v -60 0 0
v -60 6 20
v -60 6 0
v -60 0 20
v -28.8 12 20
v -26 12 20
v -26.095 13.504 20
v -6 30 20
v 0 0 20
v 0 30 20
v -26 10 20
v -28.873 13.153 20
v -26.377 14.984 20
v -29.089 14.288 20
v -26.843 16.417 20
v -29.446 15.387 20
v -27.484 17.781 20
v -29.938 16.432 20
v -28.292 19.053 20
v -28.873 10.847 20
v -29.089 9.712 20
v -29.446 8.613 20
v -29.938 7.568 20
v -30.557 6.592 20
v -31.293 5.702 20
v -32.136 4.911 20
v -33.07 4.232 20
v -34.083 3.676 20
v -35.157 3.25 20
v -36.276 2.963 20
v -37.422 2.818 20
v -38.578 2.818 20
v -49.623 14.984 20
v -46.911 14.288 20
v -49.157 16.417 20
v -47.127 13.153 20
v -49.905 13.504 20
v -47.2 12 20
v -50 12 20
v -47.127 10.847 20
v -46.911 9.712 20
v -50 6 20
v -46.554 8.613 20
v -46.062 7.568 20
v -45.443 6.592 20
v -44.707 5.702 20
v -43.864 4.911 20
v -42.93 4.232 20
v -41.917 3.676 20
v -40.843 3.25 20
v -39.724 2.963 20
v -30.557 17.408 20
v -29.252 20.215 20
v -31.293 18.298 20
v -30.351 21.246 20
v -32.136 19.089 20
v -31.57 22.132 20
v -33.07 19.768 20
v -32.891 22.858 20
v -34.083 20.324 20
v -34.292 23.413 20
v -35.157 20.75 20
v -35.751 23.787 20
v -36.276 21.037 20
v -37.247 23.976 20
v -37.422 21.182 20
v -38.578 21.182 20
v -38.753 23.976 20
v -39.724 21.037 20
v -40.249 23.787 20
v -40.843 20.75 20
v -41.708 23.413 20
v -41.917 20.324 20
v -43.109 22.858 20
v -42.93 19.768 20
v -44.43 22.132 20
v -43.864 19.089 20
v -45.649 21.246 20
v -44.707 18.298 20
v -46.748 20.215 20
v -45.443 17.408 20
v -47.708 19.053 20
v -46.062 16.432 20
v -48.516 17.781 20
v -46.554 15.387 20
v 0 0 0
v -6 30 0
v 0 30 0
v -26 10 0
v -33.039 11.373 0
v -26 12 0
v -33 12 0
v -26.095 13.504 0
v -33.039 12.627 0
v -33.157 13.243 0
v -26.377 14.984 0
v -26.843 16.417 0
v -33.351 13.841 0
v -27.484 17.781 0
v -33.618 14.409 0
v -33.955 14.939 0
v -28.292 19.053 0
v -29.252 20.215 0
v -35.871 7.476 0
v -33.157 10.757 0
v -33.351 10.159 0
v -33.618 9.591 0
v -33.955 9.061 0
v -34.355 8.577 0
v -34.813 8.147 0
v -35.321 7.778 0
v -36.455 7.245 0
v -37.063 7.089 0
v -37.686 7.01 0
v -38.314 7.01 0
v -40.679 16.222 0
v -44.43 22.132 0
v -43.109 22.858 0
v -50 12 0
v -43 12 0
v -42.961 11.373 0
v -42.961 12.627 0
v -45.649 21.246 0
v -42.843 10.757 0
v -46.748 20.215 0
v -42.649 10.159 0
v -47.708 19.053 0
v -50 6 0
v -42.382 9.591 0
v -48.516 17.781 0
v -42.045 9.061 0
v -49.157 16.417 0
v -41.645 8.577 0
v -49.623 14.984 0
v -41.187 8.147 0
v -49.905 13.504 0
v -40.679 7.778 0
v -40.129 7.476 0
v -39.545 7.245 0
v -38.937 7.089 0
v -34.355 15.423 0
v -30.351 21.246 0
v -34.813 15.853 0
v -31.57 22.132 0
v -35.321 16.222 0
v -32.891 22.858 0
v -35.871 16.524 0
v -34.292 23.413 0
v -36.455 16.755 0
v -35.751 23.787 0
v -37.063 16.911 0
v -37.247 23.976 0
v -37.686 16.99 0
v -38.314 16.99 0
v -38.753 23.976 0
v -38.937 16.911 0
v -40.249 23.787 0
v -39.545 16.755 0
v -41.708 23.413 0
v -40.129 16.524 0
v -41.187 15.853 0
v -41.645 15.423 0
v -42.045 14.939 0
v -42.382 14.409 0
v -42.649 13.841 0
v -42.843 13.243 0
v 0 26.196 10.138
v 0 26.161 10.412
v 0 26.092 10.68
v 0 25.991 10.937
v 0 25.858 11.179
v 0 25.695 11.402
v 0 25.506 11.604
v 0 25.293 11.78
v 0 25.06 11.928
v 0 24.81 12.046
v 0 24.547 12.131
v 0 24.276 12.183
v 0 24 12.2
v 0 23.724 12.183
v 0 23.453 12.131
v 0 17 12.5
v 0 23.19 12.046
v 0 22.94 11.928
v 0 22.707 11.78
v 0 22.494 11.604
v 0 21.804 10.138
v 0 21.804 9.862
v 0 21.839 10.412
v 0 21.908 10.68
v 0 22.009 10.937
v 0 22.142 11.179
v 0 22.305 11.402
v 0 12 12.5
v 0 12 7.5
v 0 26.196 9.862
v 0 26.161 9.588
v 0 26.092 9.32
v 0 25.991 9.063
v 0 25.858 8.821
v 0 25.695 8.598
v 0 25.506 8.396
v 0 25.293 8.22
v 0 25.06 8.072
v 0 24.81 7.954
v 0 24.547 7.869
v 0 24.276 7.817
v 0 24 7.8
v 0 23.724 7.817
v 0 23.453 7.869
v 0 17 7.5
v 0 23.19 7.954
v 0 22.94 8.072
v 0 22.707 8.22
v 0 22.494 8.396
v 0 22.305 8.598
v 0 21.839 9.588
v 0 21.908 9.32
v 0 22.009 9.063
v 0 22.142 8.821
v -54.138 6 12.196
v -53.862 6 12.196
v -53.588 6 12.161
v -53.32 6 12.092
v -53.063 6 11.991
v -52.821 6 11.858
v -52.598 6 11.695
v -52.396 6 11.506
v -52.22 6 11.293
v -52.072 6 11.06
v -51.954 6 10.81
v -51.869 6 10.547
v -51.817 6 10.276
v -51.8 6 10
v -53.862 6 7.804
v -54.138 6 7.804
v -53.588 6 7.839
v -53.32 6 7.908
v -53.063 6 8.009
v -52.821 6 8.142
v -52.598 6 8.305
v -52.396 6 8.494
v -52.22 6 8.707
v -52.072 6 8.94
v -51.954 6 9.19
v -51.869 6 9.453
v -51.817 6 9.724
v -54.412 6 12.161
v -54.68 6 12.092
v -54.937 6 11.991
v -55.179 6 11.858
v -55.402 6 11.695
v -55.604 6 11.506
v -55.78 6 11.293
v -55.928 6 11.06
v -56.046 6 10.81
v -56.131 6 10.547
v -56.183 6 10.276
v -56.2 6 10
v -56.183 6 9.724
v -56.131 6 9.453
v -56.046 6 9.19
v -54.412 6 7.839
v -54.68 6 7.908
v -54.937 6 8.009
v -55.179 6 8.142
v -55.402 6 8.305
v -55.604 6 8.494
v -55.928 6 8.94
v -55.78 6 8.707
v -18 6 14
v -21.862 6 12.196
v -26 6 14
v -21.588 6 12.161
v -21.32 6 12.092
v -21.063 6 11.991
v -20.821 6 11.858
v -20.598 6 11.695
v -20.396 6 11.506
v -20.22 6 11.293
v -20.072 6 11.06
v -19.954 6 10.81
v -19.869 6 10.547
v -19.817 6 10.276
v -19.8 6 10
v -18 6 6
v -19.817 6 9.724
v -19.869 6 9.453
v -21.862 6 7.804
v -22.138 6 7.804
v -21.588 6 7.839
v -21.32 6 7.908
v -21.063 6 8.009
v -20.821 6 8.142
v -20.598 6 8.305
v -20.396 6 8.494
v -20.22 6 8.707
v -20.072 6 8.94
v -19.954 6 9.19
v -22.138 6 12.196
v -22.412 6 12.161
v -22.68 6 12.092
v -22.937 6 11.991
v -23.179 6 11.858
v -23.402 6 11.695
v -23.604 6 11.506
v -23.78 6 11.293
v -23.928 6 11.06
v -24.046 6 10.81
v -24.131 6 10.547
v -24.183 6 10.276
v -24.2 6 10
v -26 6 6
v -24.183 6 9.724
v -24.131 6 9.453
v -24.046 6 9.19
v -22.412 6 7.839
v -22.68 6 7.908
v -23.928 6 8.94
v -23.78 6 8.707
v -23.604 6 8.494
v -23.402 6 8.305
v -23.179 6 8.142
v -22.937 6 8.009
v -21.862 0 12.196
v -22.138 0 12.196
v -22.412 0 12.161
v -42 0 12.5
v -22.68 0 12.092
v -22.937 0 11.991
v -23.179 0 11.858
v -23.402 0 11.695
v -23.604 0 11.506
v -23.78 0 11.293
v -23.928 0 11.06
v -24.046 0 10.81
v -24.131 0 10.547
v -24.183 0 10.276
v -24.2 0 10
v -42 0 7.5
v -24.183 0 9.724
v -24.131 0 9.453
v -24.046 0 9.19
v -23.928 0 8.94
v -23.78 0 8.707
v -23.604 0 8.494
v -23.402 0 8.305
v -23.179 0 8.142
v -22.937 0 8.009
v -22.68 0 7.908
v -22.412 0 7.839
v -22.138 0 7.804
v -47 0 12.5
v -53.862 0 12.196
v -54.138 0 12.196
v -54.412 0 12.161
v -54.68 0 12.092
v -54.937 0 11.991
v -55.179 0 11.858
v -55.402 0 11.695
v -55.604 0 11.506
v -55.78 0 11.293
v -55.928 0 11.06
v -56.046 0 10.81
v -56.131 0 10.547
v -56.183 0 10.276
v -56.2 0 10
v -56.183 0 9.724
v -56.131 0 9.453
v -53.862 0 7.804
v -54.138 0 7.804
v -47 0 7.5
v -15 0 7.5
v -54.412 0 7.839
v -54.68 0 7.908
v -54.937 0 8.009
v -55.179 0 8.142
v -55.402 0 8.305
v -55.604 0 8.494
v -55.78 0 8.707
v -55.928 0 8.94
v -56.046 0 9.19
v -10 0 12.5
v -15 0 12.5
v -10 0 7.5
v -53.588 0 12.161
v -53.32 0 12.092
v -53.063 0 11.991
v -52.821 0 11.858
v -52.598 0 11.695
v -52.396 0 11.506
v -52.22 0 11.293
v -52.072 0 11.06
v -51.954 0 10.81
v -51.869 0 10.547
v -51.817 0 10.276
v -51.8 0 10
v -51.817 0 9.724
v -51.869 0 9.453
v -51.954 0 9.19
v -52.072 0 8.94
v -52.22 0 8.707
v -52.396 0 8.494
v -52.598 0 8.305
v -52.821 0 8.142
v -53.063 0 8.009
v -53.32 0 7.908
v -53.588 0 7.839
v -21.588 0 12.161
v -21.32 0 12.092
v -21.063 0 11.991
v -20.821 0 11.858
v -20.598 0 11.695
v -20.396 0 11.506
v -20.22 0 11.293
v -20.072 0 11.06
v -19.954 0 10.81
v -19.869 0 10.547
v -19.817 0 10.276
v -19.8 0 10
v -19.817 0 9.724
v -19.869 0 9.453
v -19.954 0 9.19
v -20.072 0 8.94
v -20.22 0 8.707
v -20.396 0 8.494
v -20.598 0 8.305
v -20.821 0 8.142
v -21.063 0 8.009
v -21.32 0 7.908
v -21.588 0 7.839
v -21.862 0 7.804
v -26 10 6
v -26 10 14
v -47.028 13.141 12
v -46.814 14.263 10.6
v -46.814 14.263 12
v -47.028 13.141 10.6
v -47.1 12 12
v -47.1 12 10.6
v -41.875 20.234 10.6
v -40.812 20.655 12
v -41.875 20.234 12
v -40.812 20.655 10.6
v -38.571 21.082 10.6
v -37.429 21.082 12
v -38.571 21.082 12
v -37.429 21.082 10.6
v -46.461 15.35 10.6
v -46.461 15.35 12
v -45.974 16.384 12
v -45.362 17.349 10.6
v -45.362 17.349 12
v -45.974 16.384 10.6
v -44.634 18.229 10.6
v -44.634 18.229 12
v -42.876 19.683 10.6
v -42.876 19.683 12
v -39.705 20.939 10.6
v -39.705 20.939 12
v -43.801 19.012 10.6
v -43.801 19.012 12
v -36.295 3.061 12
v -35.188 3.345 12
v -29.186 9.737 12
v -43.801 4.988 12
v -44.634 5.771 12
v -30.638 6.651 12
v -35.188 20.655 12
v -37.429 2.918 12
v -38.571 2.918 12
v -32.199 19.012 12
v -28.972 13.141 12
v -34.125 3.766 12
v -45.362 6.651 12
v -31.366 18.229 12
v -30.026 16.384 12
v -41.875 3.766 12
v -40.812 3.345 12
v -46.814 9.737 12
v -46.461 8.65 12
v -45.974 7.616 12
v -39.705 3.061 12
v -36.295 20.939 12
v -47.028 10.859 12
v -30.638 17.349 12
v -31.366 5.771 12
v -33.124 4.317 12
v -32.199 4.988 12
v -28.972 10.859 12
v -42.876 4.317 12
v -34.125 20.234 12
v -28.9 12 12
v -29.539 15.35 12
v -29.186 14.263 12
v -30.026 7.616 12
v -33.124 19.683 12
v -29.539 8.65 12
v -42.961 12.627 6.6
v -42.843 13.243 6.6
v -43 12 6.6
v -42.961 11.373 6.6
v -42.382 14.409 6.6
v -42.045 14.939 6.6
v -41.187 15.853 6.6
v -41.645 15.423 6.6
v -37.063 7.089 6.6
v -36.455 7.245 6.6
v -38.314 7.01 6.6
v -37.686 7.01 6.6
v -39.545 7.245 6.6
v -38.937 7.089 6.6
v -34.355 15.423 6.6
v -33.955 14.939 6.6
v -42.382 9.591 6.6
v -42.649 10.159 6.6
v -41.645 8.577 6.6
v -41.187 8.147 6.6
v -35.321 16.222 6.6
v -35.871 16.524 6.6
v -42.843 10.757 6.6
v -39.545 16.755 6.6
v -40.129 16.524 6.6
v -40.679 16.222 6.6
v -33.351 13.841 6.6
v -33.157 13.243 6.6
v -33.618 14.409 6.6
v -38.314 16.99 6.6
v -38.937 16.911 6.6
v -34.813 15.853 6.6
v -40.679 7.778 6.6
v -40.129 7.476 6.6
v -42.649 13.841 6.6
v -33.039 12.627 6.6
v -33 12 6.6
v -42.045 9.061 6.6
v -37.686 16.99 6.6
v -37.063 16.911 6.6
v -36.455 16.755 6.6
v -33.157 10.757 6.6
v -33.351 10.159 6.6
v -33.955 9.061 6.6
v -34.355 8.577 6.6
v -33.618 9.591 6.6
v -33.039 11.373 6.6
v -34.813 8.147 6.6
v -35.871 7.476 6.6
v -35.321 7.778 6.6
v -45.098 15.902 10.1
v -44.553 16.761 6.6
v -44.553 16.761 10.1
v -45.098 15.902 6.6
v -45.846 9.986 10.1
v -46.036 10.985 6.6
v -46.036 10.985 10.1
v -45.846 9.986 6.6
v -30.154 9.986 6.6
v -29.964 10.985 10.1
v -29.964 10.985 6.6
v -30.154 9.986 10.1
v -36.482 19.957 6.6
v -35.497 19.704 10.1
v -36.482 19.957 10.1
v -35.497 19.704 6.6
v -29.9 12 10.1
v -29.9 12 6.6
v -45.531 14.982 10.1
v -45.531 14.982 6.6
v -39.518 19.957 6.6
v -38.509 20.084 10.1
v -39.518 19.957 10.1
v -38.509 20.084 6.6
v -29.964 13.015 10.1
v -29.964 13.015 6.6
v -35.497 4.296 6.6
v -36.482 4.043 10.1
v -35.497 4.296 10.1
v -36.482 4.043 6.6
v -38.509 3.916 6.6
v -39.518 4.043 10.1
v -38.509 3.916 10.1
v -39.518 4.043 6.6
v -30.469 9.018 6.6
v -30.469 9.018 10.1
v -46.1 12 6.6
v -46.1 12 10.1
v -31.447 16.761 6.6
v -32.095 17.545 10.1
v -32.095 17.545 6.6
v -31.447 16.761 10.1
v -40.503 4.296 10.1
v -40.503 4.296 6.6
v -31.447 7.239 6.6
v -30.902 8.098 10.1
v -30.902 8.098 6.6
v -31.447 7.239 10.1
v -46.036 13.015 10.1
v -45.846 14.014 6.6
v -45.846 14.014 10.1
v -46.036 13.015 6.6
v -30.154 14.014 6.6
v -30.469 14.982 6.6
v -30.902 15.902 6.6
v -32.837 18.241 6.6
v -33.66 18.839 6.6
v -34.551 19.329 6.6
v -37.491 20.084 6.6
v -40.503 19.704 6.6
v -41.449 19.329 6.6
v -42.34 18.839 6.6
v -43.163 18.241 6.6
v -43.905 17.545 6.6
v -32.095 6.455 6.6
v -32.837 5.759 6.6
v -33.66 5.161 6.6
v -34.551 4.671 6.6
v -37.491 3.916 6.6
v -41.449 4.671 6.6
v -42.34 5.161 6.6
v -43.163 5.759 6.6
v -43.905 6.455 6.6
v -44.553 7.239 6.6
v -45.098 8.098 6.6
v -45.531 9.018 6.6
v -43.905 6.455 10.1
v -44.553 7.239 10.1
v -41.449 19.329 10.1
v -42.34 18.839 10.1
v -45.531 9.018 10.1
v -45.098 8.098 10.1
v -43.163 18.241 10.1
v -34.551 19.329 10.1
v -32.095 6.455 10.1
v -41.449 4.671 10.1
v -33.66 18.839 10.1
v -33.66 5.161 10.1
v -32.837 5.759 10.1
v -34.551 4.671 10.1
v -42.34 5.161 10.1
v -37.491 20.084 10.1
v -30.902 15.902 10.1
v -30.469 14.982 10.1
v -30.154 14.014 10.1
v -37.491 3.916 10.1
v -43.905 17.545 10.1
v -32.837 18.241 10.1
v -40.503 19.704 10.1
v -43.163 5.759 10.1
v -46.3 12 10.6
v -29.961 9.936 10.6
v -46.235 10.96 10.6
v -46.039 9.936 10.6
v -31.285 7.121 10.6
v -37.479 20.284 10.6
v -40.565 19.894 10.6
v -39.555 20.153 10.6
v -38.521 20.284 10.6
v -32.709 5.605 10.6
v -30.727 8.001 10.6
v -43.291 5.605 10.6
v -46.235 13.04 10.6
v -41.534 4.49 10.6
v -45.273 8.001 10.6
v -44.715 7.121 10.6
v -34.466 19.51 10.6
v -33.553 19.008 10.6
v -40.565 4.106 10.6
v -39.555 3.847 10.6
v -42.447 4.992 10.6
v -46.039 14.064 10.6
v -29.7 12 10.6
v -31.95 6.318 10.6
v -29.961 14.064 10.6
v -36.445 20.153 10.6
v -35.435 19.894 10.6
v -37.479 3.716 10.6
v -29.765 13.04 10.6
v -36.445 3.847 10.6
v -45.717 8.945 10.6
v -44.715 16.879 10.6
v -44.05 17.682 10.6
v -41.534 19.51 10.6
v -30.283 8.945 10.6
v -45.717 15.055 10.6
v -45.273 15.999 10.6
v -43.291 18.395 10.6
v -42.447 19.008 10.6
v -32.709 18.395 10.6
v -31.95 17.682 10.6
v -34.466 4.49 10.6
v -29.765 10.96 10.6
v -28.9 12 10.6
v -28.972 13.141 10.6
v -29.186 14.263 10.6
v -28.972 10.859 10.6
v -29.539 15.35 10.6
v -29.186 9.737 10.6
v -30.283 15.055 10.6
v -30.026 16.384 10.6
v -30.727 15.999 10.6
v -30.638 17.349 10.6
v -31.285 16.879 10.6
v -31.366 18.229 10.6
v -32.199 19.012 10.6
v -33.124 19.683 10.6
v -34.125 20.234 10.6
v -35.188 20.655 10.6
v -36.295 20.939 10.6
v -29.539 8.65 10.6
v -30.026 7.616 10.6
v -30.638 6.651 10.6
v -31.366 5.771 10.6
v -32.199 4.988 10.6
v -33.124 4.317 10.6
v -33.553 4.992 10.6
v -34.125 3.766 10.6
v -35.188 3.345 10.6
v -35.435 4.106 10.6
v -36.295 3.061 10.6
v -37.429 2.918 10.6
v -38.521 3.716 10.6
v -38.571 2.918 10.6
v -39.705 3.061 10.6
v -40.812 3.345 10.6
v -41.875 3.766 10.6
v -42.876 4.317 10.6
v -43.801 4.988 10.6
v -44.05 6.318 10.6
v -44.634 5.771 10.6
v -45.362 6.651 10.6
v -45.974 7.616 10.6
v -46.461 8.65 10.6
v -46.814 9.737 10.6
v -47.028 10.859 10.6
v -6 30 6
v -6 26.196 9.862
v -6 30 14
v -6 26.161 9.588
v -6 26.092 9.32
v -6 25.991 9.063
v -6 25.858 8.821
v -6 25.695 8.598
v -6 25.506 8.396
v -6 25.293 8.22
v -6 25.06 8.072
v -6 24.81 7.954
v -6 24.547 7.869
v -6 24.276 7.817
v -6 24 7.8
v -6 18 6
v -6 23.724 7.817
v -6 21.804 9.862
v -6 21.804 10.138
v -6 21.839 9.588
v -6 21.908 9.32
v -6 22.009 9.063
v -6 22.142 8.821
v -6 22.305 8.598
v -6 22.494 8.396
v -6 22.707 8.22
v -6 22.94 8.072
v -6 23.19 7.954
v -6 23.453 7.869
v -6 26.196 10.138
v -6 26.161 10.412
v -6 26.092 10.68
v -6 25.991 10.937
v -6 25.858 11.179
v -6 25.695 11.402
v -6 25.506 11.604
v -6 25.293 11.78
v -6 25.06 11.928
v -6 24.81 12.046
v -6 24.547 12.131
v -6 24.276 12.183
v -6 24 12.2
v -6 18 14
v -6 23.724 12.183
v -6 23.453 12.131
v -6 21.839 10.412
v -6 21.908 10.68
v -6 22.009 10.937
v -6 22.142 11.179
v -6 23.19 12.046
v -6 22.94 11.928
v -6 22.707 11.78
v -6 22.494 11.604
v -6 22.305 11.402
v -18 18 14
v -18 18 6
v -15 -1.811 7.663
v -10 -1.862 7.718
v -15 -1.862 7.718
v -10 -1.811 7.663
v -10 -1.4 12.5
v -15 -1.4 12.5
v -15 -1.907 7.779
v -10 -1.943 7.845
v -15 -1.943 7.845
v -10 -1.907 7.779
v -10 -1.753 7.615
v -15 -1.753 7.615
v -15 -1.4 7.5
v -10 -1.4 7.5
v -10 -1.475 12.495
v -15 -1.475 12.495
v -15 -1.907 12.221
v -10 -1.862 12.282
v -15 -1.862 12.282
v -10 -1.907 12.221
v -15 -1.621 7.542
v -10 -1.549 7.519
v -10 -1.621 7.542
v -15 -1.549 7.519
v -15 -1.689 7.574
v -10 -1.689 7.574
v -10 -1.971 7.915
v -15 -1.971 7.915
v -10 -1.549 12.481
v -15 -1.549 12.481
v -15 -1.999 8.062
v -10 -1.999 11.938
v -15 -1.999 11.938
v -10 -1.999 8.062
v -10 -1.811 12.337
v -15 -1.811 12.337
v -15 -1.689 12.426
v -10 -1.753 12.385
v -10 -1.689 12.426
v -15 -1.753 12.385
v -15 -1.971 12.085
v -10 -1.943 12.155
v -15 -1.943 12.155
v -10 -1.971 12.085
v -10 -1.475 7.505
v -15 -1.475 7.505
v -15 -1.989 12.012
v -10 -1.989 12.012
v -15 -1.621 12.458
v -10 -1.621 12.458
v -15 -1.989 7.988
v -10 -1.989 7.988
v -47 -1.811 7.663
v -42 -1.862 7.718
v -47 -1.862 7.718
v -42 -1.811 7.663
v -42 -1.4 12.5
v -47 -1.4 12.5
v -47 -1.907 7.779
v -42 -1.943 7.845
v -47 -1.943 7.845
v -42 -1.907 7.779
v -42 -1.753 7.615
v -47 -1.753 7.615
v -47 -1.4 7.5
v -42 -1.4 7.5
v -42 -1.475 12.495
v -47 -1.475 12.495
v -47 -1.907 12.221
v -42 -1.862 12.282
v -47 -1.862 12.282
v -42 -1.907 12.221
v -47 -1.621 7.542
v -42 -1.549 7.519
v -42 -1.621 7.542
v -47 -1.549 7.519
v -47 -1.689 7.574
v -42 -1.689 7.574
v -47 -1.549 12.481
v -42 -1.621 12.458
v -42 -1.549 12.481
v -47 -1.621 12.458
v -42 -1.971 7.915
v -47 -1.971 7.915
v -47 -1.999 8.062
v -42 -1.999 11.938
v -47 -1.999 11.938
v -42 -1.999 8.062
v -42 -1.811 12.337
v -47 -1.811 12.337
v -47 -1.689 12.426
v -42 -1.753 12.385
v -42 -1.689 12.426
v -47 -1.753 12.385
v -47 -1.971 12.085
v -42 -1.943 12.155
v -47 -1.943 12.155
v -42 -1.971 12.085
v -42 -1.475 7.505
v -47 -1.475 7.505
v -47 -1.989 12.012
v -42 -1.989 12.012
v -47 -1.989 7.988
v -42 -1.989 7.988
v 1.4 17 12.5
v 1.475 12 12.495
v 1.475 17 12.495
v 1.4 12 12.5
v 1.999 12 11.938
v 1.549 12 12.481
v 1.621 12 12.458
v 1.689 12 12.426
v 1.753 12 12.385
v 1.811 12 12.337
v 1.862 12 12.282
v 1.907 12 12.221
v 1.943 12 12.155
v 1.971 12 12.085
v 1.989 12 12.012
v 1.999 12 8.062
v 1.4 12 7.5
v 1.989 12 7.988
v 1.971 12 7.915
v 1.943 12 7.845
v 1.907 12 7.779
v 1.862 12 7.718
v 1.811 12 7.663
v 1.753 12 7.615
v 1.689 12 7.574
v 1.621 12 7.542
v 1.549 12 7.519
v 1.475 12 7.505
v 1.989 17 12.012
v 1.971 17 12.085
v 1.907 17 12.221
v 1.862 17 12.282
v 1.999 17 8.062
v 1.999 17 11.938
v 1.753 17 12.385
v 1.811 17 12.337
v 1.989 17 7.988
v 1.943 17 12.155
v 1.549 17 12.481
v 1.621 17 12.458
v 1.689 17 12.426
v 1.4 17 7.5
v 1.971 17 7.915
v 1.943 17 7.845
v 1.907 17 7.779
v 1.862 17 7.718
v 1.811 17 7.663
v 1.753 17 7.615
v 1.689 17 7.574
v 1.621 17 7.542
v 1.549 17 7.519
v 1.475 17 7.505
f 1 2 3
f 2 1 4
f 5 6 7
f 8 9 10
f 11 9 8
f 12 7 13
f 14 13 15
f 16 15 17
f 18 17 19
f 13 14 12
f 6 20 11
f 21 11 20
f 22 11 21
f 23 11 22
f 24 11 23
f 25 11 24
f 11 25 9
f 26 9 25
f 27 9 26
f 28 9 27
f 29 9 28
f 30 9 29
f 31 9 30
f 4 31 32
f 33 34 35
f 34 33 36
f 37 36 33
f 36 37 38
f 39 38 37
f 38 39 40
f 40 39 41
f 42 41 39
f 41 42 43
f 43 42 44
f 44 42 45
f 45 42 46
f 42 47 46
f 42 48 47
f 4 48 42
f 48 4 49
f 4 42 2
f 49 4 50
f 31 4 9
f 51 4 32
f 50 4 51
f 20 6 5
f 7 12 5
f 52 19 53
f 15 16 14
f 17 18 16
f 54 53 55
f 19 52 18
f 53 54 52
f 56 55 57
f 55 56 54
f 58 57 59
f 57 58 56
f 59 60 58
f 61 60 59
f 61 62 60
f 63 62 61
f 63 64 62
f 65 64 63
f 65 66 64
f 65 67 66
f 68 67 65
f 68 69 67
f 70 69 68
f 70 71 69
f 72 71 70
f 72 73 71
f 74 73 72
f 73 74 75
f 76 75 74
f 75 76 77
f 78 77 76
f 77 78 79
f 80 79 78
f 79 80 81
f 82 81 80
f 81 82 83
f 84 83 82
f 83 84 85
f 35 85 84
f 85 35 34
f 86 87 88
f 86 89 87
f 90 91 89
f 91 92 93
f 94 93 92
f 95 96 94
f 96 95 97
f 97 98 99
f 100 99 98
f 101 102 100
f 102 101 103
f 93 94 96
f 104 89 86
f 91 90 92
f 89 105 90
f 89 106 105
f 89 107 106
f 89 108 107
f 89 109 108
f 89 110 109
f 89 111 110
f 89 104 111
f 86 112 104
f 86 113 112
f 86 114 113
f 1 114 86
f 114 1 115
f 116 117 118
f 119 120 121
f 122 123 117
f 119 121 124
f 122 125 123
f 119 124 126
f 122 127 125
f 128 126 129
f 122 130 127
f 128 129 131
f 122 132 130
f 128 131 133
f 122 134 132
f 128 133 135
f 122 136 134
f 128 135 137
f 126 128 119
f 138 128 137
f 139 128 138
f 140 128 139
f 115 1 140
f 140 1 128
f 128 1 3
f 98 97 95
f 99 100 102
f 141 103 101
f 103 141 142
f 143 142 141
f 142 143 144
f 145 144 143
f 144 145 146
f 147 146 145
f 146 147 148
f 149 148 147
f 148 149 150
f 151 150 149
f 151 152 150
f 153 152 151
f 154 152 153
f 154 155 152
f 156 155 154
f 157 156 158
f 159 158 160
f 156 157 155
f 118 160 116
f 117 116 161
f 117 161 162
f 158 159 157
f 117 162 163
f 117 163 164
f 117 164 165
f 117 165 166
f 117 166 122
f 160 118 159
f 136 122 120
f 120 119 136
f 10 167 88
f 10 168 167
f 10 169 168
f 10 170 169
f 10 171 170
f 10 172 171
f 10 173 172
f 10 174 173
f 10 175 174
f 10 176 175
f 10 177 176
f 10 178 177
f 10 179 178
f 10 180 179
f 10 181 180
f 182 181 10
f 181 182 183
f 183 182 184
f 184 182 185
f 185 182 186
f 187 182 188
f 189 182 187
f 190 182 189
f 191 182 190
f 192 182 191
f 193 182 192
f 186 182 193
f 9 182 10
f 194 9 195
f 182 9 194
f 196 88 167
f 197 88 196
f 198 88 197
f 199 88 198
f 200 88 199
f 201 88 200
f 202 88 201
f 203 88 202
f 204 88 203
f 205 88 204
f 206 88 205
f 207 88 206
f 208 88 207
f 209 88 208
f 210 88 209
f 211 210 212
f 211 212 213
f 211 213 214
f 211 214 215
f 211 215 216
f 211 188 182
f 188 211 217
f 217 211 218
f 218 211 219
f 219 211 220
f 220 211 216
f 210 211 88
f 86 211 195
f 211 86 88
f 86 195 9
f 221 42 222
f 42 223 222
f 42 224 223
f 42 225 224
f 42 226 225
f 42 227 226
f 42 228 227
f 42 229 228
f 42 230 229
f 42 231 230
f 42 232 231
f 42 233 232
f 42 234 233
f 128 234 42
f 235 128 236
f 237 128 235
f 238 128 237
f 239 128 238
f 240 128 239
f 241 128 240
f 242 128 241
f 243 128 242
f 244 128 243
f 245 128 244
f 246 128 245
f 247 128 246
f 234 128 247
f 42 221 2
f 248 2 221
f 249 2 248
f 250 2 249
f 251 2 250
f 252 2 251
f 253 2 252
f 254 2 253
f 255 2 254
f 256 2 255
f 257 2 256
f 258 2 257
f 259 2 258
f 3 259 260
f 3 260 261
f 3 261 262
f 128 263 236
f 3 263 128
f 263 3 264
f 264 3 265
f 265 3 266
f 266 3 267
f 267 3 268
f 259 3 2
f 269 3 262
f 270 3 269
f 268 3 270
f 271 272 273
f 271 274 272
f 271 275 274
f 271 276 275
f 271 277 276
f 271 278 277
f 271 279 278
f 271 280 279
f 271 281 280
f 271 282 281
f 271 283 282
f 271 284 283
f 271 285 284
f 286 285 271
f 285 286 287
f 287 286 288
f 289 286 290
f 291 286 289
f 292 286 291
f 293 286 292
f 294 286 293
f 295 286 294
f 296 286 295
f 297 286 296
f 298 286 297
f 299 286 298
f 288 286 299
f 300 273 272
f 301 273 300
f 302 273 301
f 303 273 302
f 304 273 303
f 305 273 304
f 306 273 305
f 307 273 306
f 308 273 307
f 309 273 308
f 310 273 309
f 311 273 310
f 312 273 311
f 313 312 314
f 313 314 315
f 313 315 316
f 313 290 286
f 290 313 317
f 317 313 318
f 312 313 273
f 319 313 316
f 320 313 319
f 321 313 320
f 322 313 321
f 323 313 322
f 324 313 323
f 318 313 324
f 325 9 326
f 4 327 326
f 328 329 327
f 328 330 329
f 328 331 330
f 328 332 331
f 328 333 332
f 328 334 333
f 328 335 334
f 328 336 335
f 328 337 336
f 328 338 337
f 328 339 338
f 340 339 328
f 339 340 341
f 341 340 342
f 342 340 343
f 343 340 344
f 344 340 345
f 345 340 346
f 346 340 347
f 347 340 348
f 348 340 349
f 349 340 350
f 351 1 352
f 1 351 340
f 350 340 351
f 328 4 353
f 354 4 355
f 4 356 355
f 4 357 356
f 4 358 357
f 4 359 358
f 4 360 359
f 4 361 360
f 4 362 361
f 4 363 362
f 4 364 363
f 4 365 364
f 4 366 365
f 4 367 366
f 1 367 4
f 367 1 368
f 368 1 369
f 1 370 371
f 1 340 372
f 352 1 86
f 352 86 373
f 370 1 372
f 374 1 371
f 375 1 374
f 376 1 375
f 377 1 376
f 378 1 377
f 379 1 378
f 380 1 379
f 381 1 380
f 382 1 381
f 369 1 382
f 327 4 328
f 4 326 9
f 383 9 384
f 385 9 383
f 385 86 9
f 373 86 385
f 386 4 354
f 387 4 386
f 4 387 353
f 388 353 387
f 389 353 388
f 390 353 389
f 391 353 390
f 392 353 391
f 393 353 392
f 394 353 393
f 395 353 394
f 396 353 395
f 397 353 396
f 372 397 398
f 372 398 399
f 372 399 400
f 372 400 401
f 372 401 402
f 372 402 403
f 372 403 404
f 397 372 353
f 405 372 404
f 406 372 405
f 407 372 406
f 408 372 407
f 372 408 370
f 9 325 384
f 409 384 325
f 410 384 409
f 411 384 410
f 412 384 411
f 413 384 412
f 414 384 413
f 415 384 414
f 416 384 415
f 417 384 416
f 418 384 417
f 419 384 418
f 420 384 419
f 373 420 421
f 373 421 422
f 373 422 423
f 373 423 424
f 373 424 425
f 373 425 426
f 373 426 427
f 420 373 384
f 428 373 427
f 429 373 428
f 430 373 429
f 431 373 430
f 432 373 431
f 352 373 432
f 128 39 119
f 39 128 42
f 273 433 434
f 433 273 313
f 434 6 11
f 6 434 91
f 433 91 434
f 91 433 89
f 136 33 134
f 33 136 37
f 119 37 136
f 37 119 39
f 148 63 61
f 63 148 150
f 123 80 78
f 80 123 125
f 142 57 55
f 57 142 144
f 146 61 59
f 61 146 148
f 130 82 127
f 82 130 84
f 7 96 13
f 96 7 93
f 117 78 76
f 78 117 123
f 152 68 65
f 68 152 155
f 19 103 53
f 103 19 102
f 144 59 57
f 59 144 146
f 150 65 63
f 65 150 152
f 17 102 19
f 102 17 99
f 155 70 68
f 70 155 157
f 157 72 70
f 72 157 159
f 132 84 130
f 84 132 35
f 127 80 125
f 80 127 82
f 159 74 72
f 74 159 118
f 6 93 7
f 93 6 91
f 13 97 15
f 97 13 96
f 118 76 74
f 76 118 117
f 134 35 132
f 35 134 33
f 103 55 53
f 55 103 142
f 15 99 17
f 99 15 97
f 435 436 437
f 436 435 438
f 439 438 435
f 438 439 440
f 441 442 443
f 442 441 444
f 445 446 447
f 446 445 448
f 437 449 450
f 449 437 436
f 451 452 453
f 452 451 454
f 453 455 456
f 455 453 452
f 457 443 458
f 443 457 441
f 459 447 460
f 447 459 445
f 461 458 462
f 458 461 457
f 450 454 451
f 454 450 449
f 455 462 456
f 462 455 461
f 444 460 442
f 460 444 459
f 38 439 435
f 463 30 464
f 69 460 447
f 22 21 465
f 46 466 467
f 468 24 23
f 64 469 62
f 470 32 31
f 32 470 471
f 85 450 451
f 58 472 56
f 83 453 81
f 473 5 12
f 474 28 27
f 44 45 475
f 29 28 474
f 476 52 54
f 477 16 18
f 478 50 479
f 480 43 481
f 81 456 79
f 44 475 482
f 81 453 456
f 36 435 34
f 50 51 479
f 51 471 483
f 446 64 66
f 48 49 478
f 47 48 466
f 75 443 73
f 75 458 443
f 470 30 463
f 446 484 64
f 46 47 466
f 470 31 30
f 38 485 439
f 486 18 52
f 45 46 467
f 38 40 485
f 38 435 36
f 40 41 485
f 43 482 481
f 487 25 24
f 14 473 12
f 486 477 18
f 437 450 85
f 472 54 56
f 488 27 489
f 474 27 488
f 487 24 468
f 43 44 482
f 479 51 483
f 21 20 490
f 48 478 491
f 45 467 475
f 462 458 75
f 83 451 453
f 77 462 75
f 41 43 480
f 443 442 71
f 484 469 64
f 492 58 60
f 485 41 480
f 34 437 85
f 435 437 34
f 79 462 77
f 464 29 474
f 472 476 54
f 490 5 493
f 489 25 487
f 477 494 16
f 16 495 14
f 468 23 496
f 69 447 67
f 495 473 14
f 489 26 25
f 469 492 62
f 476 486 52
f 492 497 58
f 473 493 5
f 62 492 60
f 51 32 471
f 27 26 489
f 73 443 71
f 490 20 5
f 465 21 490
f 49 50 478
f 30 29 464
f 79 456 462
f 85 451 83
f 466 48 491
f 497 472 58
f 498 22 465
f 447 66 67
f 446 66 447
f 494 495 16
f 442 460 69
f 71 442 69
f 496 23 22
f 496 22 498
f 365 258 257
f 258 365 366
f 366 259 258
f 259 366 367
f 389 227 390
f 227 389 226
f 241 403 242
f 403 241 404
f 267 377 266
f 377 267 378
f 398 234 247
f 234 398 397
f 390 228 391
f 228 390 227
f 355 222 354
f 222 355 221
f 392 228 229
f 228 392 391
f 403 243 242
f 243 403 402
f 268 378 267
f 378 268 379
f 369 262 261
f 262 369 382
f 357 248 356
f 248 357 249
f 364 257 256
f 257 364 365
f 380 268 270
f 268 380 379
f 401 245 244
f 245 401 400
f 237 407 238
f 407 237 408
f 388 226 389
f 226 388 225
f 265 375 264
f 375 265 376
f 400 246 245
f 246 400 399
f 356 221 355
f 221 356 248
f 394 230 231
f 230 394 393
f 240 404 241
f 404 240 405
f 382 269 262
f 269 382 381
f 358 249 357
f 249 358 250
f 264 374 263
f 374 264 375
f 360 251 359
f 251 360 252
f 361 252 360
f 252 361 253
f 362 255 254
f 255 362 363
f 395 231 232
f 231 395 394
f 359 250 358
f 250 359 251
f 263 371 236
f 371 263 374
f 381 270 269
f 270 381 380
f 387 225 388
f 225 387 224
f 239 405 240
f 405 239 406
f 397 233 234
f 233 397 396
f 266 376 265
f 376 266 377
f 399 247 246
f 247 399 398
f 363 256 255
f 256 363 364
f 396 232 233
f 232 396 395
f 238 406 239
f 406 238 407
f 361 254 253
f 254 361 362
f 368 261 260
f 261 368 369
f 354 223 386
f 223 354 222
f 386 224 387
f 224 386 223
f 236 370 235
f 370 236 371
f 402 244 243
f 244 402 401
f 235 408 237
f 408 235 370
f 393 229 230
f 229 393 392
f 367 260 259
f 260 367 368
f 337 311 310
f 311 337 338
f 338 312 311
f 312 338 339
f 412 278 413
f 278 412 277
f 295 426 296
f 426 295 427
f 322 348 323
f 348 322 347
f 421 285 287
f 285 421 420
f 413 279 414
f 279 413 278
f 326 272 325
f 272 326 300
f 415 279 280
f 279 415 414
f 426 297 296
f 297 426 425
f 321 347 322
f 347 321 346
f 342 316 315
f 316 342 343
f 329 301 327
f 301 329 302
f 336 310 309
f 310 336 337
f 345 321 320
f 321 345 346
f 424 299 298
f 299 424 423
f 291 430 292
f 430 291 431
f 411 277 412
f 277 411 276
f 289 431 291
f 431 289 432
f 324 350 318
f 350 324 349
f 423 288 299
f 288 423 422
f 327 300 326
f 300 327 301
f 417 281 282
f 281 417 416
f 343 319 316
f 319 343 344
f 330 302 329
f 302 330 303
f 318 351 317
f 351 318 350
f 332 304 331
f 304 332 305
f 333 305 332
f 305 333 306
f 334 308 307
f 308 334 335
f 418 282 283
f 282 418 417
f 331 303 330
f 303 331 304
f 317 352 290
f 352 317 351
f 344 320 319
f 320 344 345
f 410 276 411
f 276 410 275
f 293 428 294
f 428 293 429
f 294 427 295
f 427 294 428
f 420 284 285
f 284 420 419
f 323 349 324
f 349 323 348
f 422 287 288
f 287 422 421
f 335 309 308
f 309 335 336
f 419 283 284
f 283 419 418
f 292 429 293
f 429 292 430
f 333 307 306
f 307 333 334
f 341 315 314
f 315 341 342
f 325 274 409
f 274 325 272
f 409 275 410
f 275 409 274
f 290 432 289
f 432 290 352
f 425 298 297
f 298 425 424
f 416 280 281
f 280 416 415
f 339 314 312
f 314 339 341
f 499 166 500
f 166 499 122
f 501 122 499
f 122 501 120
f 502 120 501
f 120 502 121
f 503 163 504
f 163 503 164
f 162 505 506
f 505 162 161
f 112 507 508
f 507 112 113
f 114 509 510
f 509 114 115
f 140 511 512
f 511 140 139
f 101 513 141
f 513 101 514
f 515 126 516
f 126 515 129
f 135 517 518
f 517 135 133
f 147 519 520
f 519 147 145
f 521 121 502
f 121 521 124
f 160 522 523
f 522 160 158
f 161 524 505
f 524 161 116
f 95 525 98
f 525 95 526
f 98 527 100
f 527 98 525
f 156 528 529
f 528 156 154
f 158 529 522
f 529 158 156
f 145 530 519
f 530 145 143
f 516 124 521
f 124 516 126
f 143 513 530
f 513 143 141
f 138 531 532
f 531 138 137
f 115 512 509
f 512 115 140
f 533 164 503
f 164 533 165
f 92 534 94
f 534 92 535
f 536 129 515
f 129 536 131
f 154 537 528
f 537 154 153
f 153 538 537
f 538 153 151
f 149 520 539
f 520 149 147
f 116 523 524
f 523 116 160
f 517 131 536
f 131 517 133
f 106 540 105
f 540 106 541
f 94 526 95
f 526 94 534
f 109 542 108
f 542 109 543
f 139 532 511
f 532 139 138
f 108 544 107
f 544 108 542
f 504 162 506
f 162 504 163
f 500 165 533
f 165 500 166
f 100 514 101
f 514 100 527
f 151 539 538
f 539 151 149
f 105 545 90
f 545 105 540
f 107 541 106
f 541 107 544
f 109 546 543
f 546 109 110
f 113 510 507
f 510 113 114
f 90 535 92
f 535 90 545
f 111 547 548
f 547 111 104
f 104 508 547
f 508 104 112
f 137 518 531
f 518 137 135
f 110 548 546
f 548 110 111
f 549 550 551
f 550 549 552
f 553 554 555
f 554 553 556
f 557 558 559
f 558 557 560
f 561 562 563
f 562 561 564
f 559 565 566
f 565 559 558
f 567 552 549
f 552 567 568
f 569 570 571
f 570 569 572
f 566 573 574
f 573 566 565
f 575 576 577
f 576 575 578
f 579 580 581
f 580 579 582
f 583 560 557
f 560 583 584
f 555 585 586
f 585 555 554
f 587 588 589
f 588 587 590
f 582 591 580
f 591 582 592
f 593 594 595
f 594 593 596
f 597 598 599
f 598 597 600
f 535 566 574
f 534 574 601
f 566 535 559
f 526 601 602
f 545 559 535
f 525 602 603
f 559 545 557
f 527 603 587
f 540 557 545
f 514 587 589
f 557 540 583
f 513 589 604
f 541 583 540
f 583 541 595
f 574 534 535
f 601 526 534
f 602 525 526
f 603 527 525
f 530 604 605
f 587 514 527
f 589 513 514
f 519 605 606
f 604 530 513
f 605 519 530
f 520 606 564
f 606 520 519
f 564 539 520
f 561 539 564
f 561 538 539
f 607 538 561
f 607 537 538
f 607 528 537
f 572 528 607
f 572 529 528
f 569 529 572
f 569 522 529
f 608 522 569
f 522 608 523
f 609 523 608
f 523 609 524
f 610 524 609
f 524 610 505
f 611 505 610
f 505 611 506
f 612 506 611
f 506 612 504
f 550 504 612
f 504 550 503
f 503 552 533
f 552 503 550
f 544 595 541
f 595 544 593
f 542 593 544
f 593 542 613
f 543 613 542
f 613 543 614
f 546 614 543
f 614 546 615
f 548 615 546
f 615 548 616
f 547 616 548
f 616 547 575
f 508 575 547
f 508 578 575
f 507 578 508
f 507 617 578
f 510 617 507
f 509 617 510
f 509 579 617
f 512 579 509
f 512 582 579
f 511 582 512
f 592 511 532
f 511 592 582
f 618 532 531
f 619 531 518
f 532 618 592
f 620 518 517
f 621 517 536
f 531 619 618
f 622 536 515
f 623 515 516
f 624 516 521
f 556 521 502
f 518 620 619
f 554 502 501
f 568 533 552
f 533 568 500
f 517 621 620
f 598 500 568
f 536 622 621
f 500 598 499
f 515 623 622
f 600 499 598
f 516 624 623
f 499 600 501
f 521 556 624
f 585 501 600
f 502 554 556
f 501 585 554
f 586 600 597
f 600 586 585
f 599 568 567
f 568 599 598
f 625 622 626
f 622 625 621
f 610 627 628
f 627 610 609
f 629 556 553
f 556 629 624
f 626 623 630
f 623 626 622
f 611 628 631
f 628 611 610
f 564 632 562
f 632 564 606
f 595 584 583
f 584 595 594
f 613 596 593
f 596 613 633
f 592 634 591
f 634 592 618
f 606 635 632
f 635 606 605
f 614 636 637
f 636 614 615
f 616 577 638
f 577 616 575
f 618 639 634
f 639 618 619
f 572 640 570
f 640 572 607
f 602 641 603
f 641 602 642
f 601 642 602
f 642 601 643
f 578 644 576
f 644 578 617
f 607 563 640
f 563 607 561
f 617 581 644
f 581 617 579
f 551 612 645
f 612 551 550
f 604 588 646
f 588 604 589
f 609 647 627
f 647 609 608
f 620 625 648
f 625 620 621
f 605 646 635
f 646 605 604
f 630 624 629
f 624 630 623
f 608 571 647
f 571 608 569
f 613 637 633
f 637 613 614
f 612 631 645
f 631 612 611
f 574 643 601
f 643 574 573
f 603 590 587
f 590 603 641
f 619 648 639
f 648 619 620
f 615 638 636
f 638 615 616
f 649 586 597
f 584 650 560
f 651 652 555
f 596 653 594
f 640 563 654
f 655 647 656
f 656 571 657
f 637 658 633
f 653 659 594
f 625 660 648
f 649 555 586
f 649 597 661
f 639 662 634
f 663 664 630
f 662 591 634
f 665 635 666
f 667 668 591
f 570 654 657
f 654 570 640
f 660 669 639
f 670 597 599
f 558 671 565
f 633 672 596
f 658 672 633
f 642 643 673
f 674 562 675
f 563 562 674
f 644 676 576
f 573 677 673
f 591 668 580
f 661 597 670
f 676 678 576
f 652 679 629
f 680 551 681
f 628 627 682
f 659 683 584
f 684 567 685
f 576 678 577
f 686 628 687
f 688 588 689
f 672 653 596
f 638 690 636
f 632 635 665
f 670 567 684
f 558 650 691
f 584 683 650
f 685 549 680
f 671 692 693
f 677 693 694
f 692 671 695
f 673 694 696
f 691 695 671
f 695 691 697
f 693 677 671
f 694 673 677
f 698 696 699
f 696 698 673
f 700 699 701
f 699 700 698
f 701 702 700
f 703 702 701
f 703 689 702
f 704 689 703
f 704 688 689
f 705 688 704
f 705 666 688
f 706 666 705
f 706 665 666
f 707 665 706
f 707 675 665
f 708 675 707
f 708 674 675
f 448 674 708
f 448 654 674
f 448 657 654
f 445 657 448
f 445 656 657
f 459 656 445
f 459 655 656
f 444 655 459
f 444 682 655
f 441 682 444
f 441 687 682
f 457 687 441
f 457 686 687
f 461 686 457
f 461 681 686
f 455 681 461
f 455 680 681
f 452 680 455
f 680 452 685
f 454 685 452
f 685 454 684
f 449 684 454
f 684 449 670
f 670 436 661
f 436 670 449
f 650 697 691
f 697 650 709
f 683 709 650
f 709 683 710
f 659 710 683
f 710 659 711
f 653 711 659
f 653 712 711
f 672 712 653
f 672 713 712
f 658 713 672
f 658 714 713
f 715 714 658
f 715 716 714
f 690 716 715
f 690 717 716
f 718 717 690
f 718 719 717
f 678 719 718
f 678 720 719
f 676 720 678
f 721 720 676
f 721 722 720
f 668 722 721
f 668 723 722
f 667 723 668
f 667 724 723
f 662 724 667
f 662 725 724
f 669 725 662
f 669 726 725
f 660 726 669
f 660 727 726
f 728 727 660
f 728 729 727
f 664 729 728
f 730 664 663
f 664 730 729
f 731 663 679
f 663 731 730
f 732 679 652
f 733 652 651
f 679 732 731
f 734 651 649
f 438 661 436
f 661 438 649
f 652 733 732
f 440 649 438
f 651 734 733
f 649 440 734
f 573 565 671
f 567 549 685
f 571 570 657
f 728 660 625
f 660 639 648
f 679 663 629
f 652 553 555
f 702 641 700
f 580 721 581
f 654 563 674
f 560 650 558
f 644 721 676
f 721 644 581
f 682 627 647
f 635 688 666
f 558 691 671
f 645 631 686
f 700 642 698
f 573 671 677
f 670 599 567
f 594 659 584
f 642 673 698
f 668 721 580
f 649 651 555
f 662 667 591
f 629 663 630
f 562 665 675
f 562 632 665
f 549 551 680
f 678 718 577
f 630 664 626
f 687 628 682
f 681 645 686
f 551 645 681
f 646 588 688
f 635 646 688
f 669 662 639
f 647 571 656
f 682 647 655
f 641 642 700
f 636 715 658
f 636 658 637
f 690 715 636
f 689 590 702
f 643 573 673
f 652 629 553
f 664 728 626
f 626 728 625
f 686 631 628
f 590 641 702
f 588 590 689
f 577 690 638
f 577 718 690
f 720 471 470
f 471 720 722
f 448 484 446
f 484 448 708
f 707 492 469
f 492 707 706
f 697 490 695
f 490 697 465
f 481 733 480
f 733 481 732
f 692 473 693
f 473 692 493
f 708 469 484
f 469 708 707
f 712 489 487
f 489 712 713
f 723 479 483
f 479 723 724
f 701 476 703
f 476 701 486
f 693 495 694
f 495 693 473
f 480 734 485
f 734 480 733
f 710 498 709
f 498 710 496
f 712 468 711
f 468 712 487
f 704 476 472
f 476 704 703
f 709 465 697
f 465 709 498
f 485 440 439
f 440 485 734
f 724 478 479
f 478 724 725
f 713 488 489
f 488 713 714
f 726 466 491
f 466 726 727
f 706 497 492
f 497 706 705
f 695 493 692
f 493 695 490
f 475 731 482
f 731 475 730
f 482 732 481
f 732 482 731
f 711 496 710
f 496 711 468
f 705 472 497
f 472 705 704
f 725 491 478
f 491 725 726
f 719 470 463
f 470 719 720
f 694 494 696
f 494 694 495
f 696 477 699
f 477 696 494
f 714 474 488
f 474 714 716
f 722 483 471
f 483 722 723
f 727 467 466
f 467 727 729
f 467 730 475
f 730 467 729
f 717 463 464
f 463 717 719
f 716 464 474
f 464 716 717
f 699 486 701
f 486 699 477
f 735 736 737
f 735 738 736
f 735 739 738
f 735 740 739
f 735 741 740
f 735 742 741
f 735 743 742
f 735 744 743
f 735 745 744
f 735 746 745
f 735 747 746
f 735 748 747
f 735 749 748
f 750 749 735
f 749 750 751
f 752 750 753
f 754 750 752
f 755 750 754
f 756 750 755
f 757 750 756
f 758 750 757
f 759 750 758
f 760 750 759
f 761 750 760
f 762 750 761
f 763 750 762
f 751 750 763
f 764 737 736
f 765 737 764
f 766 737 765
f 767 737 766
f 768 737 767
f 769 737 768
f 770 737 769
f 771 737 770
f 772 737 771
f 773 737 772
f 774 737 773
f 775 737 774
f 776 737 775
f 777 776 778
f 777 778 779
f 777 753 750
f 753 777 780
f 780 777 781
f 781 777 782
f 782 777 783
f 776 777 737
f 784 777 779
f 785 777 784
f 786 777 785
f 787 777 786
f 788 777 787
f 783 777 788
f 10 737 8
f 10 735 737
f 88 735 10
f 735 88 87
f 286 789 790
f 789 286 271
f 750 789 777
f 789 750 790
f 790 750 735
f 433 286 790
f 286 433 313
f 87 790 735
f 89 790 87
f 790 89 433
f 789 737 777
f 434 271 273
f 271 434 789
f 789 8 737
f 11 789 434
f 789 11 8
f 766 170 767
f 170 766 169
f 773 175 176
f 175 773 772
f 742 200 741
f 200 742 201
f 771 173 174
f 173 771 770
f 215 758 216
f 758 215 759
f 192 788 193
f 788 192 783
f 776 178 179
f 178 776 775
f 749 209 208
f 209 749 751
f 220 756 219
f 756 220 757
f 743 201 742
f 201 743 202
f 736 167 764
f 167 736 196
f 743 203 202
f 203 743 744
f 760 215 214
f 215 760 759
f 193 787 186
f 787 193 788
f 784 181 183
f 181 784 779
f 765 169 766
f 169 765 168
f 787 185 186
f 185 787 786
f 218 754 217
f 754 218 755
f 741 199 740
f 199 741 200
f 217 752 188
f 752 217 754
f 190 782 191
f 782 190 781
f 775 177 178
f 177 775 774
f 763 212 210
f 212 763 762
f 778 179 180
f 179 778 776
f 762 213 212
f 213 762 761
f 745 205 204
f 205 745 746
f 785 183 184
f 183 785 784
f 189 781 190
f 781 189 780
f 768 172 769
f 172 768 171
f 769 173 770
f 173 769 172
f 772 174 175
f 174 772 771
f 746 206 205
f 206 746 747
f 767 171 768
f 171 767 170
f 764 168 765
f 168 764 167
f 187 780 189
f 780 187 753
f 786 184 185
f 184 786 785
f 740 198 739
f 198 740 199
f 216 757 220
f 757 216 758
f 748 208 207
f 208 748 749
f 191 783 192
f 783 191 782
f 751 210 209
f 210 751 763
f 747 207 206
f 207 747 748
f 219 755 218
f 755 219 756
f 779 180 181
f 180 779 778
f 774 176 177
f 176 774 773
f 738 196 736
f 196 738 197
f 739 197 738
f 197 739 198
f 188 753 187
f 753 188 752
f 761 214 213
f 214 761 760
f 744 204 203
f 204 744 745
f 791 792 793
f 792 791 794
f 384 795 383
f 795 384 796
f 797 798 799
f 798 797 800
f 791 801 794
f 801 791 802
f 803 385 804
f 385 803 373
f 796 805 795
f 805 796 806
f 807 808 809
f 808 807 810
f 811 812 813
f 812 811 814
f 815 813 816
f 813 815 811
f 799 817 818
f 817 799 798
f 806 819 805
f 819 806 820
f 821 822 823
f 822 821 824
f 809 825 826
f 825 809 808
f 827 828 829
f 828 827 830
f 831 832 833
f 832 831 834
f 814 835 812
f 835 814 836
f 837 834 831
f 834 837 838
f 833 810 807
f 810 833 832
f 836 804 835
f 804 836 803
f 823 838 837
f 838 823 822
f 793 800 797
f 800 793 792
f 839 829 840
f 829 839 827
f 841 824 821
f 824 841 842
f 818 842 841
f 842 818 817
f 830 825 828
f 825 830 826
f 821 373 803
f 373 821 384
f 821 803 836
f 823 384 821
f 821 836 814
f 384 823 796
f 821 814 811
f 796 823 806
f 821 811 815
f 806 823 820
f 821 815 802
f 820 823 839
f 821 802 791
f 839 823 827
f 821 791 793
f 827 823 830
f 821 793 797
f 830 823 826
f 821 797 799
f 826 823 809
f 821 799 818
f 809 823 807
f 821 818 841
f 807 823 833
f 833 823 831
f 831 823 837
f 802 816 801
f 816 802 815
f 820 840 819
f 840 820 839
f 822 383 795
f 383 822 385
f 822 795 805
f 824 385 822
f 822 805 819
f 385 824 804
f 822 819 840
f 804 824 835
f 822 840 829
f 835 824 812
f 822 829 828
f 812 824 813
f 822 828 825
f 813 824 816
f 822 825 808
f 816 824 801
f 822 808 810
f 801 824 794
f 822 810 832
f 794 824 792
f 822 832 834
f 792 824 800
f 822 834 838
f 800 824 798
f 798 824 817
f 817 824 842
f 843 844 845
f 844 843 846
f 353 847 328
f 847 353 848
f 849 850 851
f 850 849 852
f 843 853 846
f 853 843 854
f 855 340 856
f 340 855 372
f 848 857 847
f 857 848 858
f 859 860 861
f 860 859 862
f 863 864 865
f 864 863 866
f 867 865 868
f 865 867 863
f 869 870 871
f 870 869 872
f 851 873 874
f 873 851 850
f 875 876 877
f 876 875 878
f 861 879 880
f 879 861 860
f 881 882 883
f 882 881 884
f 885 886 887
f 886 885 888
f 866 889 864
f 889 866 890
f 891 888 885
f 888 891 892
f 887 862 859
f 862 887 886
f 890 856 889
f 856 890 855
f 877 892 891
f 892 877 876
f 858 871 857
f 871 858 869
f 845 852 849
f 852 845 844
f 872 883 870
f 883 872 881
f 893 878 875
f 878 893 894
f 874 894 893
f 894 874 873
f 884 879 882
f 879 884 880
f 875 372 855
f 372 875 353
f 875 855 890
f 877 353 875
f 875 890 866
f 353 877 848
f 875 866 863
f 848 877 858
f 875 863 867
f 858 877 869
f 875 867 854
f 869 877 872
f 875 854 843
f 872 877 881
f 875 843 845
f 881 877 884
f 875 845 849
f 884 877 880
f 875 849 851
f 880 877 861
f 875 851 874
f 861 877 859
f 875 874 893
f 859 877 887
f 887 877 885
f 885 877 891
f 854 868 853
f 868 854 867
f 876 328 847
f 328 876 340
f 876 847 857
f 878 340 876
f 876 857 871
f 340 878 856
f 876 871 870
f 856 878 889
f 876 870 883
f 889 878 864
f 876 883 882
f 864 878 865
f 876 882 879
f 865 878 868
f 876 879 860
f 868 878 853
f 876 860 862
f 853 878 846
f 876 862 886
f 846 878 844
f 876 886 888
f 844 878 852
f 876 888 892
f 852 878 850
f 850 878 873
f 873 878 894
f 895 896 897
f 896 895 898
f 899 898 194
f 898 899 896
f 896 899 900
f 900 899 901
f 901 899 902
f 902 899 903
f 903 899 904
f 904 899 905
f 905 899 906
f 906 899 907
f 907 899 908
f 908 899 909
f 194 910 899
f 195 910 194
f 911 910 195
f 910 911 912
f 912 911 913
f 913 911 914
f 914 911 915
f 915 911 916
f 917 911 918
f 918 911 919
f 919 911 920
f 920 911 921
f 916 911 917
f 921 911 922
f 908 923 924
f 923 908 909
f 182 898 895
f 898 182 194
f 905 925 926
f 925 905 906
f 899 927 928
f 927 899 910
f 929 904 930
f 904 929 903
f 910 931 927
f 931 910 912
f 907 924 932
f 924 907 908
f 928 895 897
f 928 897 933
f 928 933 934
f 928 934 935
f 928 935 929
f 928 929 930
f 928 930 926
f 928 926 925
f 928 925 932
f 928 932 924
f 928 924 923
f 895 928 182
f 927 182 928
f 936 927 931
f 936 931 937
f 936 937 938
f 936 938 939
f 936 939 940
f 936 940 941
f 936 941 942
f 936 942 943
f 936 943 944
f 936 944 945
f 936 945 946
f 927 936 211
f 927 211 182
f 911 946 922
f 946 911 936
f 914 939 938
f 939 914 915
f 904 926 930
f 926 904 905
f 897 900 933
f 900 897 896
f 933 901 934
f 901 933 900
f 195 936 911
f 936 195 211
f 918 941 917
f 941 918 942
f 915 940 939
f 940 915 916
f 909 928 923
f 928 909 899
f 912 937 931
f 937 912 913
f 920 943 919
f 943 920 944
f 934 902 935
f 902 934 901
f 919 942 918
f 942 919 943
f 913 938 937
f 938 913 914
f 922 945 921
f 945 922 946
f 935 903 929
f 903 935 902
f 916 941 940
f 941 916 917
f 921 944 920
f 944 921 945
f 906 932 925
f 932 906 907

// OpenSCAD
// file: ../lib/nutsnbolts/data-access.scad
// Norm Nuts and Bolts - a OpenSCAD library
// Copyright (C) 2012  Johannes Kneer

// This program is free software: you can redistribute it and/or modify
// it under the terms of the GNU General Public License as published by
// the Free Software Foundation, either version 3 of the License, or
// (at your option) any later version.

// This program is distributed in the hope that it will be useful,
// but WITHOUT ANY WARRANTY; without even the implied warranty of
// MERCHANTABILITY or FITNESS FOR A PARTICULAR PURPOSE.  See the
// GNU General Public License for more details.

// You should have received a copy of the GNU General Public License
// along with this program.  If not, see <http://www.gnu.org/licenses/>.


// DATABASE ACCESS FUNCTIONS AND CONSTANTS



// == CONSTANTS == 

// screw table access keys
_NB_S_DESC            = 0;
_NB_S_FAMKEY			 = 1;
_NB_S_LENGTH          = 2;
_NB_S_NOTHREAD_LENGTH = 3;

_NB_F_DESC			 = 0;
_NB_F_OUTER_DIA       = 1;
_NB_F_INNER_DIA       = 2;
_NB_F_LEAD            = 3; 
_NB_F_KEY             = 4;
_NB_F_KEY_DEPTH       = 5;
_NB_F_HEAD_HEIGHT     = 6;
_NB_F_HEAD_DIA        = 7;
_NB_F_NUT_KEY         = 8;
_NB_F_NUT_HEIGHT      = 9;


// == FUNCTIONS ==

// _get_screw("descriptor")   with descriptor = M8x25
//   find the line for a general object in the data matrix

function _get_screw(n) = data_screw[search([n], data_screw)[0]];
function _get_screw_fam(n) = data_screw_fam[search([_get_screw(n)[_NB_S_FAMKEY]], data_screw_fam)[0]];

function _get_fam(n) = data_screw_fam[search([n], data_screw_fam)[0]];


// _get_XXXXX("descriptor") functions
// find a single property in the database

function _get_desc(n)        = _get_screw(n)[_NB_S_DESC];
function _get_famkey(n)         = _get_screw(n)[_NB_S_FAMKEY];
function _get_length(n)      = _get_screw(n)[_NB_S_LENGTH];
function _get_nt_length(n)   = _get_screw(n)[_NB_S_NOTHREAD_LENGTH];

function _get_outer_dia(n)   = _get_screw_fam(n)[_NB_F_OUTER_DIA];
function _get_inner_dia(n)   = _get_screw_fam(n)[_NB_F_INNER_DIA];
function _get_lead(n)        = _get_screw_fam(n)[_NB_F_LEAD];
function _get_head_height(n) = _get_screw_fam(n)[_NB_F_HEAD_HEIGHT];
function _get_head_dia(n)    = _get_screw_fam(n)[_NB_F_HEAD_DIA];
function _get_nut_key(n)     = _get_screw_fam(n)[_NB_F_NUT_KEY];
function _get_nut_height(n)  = _get_screw_fam(n)[_NB_F_NUT_HEIGHT];
// file: ../globals.scad
// Global variables

$fn = 50;
clearance = 0.4; // Nozzle width
// file: f688zz.scad
include <../globals.scad>;

module f688zz_mount()
{
    difference(){
        cylinder(d=24,h=12);
        cylinder(d=10,h=12);
        translate([0,0,7-clearance])cylinder(d=16+clearance/2,h=12);
        translate([0,0,10.3-clearance/2])cylinder(d1=16+clearance/2,d2=16.4+clearance/2,h=0.5);
        translate([0,0,10.8-clearance/2])cylinder(d=18+clearance/2,h=12);
    }
} 
// main file
include <f688zz.scad>
include <../lib/nutsnbolts/cyl_head_bolt.scad>;

module gantry_x_back_right()
{
    mirror([1,0,0]){
        difference(){
            union(){
                cube([60,6,20]);
                translate([26,0,0])cube([24,12,20]);
                translate([38,12,0])cylinder(d=24,h=20);
            }
            translate([38,12,0])cylinder(d=18+clearance/2,h=12);
            translate([38,12,12])cylinder(d1=18+clearance/2,d2=18+clearance,h=8);
            translate([54,0,10])rotate([90,0,0])hole_through("M4",l=8, cld=clearance);
            translate([22,0,10])rotate([90,0,0])hole_through("M4",l=8, cld=clearance);
        }
        translate([38,12,0])f688zz_mount();
        
        intersection(){
            difference(){
                union(){
                    cube([6,30,20]);
                    cube([18,18,20]);
                    translate([6,-18,0])rotate([0,0,45])cube([24*sqrt(2),24*sqrt(2),6]);
                    translate([6,-18,14])rotate([0,0,45])cube([24*sqrt(2),24*sqrt(2),6]);
                }
                translate([0,24,10])rotate([0,-90,0])hole_through("M4",l=8, cld=clearance);
            }
            cube([26,30,20]);
        }
    
        
        translate([15,-2,7.5])rotate([0,-90,0])translate([0.6,0.6,0])minkowski(){
            cube([3.8,2,4]);
            cylinder(d=1.2,h=1);
        }
        translate([47,-2,7.5])rotate([0,-90,0])translate([0.6,0.6,0])minkowski(){
            cube([3.8,2,4]);
            cylinder(d=1.2,h=1);
        }
        translate([1.2,17,7.5])rotate([0,-90,90])translate([0.6,0.6,0])minkowski(){
            cube([3.8,2,4]);
            cylinder(d=1.2,h=1);
        }
    }
}

gantry_x_back_right();
